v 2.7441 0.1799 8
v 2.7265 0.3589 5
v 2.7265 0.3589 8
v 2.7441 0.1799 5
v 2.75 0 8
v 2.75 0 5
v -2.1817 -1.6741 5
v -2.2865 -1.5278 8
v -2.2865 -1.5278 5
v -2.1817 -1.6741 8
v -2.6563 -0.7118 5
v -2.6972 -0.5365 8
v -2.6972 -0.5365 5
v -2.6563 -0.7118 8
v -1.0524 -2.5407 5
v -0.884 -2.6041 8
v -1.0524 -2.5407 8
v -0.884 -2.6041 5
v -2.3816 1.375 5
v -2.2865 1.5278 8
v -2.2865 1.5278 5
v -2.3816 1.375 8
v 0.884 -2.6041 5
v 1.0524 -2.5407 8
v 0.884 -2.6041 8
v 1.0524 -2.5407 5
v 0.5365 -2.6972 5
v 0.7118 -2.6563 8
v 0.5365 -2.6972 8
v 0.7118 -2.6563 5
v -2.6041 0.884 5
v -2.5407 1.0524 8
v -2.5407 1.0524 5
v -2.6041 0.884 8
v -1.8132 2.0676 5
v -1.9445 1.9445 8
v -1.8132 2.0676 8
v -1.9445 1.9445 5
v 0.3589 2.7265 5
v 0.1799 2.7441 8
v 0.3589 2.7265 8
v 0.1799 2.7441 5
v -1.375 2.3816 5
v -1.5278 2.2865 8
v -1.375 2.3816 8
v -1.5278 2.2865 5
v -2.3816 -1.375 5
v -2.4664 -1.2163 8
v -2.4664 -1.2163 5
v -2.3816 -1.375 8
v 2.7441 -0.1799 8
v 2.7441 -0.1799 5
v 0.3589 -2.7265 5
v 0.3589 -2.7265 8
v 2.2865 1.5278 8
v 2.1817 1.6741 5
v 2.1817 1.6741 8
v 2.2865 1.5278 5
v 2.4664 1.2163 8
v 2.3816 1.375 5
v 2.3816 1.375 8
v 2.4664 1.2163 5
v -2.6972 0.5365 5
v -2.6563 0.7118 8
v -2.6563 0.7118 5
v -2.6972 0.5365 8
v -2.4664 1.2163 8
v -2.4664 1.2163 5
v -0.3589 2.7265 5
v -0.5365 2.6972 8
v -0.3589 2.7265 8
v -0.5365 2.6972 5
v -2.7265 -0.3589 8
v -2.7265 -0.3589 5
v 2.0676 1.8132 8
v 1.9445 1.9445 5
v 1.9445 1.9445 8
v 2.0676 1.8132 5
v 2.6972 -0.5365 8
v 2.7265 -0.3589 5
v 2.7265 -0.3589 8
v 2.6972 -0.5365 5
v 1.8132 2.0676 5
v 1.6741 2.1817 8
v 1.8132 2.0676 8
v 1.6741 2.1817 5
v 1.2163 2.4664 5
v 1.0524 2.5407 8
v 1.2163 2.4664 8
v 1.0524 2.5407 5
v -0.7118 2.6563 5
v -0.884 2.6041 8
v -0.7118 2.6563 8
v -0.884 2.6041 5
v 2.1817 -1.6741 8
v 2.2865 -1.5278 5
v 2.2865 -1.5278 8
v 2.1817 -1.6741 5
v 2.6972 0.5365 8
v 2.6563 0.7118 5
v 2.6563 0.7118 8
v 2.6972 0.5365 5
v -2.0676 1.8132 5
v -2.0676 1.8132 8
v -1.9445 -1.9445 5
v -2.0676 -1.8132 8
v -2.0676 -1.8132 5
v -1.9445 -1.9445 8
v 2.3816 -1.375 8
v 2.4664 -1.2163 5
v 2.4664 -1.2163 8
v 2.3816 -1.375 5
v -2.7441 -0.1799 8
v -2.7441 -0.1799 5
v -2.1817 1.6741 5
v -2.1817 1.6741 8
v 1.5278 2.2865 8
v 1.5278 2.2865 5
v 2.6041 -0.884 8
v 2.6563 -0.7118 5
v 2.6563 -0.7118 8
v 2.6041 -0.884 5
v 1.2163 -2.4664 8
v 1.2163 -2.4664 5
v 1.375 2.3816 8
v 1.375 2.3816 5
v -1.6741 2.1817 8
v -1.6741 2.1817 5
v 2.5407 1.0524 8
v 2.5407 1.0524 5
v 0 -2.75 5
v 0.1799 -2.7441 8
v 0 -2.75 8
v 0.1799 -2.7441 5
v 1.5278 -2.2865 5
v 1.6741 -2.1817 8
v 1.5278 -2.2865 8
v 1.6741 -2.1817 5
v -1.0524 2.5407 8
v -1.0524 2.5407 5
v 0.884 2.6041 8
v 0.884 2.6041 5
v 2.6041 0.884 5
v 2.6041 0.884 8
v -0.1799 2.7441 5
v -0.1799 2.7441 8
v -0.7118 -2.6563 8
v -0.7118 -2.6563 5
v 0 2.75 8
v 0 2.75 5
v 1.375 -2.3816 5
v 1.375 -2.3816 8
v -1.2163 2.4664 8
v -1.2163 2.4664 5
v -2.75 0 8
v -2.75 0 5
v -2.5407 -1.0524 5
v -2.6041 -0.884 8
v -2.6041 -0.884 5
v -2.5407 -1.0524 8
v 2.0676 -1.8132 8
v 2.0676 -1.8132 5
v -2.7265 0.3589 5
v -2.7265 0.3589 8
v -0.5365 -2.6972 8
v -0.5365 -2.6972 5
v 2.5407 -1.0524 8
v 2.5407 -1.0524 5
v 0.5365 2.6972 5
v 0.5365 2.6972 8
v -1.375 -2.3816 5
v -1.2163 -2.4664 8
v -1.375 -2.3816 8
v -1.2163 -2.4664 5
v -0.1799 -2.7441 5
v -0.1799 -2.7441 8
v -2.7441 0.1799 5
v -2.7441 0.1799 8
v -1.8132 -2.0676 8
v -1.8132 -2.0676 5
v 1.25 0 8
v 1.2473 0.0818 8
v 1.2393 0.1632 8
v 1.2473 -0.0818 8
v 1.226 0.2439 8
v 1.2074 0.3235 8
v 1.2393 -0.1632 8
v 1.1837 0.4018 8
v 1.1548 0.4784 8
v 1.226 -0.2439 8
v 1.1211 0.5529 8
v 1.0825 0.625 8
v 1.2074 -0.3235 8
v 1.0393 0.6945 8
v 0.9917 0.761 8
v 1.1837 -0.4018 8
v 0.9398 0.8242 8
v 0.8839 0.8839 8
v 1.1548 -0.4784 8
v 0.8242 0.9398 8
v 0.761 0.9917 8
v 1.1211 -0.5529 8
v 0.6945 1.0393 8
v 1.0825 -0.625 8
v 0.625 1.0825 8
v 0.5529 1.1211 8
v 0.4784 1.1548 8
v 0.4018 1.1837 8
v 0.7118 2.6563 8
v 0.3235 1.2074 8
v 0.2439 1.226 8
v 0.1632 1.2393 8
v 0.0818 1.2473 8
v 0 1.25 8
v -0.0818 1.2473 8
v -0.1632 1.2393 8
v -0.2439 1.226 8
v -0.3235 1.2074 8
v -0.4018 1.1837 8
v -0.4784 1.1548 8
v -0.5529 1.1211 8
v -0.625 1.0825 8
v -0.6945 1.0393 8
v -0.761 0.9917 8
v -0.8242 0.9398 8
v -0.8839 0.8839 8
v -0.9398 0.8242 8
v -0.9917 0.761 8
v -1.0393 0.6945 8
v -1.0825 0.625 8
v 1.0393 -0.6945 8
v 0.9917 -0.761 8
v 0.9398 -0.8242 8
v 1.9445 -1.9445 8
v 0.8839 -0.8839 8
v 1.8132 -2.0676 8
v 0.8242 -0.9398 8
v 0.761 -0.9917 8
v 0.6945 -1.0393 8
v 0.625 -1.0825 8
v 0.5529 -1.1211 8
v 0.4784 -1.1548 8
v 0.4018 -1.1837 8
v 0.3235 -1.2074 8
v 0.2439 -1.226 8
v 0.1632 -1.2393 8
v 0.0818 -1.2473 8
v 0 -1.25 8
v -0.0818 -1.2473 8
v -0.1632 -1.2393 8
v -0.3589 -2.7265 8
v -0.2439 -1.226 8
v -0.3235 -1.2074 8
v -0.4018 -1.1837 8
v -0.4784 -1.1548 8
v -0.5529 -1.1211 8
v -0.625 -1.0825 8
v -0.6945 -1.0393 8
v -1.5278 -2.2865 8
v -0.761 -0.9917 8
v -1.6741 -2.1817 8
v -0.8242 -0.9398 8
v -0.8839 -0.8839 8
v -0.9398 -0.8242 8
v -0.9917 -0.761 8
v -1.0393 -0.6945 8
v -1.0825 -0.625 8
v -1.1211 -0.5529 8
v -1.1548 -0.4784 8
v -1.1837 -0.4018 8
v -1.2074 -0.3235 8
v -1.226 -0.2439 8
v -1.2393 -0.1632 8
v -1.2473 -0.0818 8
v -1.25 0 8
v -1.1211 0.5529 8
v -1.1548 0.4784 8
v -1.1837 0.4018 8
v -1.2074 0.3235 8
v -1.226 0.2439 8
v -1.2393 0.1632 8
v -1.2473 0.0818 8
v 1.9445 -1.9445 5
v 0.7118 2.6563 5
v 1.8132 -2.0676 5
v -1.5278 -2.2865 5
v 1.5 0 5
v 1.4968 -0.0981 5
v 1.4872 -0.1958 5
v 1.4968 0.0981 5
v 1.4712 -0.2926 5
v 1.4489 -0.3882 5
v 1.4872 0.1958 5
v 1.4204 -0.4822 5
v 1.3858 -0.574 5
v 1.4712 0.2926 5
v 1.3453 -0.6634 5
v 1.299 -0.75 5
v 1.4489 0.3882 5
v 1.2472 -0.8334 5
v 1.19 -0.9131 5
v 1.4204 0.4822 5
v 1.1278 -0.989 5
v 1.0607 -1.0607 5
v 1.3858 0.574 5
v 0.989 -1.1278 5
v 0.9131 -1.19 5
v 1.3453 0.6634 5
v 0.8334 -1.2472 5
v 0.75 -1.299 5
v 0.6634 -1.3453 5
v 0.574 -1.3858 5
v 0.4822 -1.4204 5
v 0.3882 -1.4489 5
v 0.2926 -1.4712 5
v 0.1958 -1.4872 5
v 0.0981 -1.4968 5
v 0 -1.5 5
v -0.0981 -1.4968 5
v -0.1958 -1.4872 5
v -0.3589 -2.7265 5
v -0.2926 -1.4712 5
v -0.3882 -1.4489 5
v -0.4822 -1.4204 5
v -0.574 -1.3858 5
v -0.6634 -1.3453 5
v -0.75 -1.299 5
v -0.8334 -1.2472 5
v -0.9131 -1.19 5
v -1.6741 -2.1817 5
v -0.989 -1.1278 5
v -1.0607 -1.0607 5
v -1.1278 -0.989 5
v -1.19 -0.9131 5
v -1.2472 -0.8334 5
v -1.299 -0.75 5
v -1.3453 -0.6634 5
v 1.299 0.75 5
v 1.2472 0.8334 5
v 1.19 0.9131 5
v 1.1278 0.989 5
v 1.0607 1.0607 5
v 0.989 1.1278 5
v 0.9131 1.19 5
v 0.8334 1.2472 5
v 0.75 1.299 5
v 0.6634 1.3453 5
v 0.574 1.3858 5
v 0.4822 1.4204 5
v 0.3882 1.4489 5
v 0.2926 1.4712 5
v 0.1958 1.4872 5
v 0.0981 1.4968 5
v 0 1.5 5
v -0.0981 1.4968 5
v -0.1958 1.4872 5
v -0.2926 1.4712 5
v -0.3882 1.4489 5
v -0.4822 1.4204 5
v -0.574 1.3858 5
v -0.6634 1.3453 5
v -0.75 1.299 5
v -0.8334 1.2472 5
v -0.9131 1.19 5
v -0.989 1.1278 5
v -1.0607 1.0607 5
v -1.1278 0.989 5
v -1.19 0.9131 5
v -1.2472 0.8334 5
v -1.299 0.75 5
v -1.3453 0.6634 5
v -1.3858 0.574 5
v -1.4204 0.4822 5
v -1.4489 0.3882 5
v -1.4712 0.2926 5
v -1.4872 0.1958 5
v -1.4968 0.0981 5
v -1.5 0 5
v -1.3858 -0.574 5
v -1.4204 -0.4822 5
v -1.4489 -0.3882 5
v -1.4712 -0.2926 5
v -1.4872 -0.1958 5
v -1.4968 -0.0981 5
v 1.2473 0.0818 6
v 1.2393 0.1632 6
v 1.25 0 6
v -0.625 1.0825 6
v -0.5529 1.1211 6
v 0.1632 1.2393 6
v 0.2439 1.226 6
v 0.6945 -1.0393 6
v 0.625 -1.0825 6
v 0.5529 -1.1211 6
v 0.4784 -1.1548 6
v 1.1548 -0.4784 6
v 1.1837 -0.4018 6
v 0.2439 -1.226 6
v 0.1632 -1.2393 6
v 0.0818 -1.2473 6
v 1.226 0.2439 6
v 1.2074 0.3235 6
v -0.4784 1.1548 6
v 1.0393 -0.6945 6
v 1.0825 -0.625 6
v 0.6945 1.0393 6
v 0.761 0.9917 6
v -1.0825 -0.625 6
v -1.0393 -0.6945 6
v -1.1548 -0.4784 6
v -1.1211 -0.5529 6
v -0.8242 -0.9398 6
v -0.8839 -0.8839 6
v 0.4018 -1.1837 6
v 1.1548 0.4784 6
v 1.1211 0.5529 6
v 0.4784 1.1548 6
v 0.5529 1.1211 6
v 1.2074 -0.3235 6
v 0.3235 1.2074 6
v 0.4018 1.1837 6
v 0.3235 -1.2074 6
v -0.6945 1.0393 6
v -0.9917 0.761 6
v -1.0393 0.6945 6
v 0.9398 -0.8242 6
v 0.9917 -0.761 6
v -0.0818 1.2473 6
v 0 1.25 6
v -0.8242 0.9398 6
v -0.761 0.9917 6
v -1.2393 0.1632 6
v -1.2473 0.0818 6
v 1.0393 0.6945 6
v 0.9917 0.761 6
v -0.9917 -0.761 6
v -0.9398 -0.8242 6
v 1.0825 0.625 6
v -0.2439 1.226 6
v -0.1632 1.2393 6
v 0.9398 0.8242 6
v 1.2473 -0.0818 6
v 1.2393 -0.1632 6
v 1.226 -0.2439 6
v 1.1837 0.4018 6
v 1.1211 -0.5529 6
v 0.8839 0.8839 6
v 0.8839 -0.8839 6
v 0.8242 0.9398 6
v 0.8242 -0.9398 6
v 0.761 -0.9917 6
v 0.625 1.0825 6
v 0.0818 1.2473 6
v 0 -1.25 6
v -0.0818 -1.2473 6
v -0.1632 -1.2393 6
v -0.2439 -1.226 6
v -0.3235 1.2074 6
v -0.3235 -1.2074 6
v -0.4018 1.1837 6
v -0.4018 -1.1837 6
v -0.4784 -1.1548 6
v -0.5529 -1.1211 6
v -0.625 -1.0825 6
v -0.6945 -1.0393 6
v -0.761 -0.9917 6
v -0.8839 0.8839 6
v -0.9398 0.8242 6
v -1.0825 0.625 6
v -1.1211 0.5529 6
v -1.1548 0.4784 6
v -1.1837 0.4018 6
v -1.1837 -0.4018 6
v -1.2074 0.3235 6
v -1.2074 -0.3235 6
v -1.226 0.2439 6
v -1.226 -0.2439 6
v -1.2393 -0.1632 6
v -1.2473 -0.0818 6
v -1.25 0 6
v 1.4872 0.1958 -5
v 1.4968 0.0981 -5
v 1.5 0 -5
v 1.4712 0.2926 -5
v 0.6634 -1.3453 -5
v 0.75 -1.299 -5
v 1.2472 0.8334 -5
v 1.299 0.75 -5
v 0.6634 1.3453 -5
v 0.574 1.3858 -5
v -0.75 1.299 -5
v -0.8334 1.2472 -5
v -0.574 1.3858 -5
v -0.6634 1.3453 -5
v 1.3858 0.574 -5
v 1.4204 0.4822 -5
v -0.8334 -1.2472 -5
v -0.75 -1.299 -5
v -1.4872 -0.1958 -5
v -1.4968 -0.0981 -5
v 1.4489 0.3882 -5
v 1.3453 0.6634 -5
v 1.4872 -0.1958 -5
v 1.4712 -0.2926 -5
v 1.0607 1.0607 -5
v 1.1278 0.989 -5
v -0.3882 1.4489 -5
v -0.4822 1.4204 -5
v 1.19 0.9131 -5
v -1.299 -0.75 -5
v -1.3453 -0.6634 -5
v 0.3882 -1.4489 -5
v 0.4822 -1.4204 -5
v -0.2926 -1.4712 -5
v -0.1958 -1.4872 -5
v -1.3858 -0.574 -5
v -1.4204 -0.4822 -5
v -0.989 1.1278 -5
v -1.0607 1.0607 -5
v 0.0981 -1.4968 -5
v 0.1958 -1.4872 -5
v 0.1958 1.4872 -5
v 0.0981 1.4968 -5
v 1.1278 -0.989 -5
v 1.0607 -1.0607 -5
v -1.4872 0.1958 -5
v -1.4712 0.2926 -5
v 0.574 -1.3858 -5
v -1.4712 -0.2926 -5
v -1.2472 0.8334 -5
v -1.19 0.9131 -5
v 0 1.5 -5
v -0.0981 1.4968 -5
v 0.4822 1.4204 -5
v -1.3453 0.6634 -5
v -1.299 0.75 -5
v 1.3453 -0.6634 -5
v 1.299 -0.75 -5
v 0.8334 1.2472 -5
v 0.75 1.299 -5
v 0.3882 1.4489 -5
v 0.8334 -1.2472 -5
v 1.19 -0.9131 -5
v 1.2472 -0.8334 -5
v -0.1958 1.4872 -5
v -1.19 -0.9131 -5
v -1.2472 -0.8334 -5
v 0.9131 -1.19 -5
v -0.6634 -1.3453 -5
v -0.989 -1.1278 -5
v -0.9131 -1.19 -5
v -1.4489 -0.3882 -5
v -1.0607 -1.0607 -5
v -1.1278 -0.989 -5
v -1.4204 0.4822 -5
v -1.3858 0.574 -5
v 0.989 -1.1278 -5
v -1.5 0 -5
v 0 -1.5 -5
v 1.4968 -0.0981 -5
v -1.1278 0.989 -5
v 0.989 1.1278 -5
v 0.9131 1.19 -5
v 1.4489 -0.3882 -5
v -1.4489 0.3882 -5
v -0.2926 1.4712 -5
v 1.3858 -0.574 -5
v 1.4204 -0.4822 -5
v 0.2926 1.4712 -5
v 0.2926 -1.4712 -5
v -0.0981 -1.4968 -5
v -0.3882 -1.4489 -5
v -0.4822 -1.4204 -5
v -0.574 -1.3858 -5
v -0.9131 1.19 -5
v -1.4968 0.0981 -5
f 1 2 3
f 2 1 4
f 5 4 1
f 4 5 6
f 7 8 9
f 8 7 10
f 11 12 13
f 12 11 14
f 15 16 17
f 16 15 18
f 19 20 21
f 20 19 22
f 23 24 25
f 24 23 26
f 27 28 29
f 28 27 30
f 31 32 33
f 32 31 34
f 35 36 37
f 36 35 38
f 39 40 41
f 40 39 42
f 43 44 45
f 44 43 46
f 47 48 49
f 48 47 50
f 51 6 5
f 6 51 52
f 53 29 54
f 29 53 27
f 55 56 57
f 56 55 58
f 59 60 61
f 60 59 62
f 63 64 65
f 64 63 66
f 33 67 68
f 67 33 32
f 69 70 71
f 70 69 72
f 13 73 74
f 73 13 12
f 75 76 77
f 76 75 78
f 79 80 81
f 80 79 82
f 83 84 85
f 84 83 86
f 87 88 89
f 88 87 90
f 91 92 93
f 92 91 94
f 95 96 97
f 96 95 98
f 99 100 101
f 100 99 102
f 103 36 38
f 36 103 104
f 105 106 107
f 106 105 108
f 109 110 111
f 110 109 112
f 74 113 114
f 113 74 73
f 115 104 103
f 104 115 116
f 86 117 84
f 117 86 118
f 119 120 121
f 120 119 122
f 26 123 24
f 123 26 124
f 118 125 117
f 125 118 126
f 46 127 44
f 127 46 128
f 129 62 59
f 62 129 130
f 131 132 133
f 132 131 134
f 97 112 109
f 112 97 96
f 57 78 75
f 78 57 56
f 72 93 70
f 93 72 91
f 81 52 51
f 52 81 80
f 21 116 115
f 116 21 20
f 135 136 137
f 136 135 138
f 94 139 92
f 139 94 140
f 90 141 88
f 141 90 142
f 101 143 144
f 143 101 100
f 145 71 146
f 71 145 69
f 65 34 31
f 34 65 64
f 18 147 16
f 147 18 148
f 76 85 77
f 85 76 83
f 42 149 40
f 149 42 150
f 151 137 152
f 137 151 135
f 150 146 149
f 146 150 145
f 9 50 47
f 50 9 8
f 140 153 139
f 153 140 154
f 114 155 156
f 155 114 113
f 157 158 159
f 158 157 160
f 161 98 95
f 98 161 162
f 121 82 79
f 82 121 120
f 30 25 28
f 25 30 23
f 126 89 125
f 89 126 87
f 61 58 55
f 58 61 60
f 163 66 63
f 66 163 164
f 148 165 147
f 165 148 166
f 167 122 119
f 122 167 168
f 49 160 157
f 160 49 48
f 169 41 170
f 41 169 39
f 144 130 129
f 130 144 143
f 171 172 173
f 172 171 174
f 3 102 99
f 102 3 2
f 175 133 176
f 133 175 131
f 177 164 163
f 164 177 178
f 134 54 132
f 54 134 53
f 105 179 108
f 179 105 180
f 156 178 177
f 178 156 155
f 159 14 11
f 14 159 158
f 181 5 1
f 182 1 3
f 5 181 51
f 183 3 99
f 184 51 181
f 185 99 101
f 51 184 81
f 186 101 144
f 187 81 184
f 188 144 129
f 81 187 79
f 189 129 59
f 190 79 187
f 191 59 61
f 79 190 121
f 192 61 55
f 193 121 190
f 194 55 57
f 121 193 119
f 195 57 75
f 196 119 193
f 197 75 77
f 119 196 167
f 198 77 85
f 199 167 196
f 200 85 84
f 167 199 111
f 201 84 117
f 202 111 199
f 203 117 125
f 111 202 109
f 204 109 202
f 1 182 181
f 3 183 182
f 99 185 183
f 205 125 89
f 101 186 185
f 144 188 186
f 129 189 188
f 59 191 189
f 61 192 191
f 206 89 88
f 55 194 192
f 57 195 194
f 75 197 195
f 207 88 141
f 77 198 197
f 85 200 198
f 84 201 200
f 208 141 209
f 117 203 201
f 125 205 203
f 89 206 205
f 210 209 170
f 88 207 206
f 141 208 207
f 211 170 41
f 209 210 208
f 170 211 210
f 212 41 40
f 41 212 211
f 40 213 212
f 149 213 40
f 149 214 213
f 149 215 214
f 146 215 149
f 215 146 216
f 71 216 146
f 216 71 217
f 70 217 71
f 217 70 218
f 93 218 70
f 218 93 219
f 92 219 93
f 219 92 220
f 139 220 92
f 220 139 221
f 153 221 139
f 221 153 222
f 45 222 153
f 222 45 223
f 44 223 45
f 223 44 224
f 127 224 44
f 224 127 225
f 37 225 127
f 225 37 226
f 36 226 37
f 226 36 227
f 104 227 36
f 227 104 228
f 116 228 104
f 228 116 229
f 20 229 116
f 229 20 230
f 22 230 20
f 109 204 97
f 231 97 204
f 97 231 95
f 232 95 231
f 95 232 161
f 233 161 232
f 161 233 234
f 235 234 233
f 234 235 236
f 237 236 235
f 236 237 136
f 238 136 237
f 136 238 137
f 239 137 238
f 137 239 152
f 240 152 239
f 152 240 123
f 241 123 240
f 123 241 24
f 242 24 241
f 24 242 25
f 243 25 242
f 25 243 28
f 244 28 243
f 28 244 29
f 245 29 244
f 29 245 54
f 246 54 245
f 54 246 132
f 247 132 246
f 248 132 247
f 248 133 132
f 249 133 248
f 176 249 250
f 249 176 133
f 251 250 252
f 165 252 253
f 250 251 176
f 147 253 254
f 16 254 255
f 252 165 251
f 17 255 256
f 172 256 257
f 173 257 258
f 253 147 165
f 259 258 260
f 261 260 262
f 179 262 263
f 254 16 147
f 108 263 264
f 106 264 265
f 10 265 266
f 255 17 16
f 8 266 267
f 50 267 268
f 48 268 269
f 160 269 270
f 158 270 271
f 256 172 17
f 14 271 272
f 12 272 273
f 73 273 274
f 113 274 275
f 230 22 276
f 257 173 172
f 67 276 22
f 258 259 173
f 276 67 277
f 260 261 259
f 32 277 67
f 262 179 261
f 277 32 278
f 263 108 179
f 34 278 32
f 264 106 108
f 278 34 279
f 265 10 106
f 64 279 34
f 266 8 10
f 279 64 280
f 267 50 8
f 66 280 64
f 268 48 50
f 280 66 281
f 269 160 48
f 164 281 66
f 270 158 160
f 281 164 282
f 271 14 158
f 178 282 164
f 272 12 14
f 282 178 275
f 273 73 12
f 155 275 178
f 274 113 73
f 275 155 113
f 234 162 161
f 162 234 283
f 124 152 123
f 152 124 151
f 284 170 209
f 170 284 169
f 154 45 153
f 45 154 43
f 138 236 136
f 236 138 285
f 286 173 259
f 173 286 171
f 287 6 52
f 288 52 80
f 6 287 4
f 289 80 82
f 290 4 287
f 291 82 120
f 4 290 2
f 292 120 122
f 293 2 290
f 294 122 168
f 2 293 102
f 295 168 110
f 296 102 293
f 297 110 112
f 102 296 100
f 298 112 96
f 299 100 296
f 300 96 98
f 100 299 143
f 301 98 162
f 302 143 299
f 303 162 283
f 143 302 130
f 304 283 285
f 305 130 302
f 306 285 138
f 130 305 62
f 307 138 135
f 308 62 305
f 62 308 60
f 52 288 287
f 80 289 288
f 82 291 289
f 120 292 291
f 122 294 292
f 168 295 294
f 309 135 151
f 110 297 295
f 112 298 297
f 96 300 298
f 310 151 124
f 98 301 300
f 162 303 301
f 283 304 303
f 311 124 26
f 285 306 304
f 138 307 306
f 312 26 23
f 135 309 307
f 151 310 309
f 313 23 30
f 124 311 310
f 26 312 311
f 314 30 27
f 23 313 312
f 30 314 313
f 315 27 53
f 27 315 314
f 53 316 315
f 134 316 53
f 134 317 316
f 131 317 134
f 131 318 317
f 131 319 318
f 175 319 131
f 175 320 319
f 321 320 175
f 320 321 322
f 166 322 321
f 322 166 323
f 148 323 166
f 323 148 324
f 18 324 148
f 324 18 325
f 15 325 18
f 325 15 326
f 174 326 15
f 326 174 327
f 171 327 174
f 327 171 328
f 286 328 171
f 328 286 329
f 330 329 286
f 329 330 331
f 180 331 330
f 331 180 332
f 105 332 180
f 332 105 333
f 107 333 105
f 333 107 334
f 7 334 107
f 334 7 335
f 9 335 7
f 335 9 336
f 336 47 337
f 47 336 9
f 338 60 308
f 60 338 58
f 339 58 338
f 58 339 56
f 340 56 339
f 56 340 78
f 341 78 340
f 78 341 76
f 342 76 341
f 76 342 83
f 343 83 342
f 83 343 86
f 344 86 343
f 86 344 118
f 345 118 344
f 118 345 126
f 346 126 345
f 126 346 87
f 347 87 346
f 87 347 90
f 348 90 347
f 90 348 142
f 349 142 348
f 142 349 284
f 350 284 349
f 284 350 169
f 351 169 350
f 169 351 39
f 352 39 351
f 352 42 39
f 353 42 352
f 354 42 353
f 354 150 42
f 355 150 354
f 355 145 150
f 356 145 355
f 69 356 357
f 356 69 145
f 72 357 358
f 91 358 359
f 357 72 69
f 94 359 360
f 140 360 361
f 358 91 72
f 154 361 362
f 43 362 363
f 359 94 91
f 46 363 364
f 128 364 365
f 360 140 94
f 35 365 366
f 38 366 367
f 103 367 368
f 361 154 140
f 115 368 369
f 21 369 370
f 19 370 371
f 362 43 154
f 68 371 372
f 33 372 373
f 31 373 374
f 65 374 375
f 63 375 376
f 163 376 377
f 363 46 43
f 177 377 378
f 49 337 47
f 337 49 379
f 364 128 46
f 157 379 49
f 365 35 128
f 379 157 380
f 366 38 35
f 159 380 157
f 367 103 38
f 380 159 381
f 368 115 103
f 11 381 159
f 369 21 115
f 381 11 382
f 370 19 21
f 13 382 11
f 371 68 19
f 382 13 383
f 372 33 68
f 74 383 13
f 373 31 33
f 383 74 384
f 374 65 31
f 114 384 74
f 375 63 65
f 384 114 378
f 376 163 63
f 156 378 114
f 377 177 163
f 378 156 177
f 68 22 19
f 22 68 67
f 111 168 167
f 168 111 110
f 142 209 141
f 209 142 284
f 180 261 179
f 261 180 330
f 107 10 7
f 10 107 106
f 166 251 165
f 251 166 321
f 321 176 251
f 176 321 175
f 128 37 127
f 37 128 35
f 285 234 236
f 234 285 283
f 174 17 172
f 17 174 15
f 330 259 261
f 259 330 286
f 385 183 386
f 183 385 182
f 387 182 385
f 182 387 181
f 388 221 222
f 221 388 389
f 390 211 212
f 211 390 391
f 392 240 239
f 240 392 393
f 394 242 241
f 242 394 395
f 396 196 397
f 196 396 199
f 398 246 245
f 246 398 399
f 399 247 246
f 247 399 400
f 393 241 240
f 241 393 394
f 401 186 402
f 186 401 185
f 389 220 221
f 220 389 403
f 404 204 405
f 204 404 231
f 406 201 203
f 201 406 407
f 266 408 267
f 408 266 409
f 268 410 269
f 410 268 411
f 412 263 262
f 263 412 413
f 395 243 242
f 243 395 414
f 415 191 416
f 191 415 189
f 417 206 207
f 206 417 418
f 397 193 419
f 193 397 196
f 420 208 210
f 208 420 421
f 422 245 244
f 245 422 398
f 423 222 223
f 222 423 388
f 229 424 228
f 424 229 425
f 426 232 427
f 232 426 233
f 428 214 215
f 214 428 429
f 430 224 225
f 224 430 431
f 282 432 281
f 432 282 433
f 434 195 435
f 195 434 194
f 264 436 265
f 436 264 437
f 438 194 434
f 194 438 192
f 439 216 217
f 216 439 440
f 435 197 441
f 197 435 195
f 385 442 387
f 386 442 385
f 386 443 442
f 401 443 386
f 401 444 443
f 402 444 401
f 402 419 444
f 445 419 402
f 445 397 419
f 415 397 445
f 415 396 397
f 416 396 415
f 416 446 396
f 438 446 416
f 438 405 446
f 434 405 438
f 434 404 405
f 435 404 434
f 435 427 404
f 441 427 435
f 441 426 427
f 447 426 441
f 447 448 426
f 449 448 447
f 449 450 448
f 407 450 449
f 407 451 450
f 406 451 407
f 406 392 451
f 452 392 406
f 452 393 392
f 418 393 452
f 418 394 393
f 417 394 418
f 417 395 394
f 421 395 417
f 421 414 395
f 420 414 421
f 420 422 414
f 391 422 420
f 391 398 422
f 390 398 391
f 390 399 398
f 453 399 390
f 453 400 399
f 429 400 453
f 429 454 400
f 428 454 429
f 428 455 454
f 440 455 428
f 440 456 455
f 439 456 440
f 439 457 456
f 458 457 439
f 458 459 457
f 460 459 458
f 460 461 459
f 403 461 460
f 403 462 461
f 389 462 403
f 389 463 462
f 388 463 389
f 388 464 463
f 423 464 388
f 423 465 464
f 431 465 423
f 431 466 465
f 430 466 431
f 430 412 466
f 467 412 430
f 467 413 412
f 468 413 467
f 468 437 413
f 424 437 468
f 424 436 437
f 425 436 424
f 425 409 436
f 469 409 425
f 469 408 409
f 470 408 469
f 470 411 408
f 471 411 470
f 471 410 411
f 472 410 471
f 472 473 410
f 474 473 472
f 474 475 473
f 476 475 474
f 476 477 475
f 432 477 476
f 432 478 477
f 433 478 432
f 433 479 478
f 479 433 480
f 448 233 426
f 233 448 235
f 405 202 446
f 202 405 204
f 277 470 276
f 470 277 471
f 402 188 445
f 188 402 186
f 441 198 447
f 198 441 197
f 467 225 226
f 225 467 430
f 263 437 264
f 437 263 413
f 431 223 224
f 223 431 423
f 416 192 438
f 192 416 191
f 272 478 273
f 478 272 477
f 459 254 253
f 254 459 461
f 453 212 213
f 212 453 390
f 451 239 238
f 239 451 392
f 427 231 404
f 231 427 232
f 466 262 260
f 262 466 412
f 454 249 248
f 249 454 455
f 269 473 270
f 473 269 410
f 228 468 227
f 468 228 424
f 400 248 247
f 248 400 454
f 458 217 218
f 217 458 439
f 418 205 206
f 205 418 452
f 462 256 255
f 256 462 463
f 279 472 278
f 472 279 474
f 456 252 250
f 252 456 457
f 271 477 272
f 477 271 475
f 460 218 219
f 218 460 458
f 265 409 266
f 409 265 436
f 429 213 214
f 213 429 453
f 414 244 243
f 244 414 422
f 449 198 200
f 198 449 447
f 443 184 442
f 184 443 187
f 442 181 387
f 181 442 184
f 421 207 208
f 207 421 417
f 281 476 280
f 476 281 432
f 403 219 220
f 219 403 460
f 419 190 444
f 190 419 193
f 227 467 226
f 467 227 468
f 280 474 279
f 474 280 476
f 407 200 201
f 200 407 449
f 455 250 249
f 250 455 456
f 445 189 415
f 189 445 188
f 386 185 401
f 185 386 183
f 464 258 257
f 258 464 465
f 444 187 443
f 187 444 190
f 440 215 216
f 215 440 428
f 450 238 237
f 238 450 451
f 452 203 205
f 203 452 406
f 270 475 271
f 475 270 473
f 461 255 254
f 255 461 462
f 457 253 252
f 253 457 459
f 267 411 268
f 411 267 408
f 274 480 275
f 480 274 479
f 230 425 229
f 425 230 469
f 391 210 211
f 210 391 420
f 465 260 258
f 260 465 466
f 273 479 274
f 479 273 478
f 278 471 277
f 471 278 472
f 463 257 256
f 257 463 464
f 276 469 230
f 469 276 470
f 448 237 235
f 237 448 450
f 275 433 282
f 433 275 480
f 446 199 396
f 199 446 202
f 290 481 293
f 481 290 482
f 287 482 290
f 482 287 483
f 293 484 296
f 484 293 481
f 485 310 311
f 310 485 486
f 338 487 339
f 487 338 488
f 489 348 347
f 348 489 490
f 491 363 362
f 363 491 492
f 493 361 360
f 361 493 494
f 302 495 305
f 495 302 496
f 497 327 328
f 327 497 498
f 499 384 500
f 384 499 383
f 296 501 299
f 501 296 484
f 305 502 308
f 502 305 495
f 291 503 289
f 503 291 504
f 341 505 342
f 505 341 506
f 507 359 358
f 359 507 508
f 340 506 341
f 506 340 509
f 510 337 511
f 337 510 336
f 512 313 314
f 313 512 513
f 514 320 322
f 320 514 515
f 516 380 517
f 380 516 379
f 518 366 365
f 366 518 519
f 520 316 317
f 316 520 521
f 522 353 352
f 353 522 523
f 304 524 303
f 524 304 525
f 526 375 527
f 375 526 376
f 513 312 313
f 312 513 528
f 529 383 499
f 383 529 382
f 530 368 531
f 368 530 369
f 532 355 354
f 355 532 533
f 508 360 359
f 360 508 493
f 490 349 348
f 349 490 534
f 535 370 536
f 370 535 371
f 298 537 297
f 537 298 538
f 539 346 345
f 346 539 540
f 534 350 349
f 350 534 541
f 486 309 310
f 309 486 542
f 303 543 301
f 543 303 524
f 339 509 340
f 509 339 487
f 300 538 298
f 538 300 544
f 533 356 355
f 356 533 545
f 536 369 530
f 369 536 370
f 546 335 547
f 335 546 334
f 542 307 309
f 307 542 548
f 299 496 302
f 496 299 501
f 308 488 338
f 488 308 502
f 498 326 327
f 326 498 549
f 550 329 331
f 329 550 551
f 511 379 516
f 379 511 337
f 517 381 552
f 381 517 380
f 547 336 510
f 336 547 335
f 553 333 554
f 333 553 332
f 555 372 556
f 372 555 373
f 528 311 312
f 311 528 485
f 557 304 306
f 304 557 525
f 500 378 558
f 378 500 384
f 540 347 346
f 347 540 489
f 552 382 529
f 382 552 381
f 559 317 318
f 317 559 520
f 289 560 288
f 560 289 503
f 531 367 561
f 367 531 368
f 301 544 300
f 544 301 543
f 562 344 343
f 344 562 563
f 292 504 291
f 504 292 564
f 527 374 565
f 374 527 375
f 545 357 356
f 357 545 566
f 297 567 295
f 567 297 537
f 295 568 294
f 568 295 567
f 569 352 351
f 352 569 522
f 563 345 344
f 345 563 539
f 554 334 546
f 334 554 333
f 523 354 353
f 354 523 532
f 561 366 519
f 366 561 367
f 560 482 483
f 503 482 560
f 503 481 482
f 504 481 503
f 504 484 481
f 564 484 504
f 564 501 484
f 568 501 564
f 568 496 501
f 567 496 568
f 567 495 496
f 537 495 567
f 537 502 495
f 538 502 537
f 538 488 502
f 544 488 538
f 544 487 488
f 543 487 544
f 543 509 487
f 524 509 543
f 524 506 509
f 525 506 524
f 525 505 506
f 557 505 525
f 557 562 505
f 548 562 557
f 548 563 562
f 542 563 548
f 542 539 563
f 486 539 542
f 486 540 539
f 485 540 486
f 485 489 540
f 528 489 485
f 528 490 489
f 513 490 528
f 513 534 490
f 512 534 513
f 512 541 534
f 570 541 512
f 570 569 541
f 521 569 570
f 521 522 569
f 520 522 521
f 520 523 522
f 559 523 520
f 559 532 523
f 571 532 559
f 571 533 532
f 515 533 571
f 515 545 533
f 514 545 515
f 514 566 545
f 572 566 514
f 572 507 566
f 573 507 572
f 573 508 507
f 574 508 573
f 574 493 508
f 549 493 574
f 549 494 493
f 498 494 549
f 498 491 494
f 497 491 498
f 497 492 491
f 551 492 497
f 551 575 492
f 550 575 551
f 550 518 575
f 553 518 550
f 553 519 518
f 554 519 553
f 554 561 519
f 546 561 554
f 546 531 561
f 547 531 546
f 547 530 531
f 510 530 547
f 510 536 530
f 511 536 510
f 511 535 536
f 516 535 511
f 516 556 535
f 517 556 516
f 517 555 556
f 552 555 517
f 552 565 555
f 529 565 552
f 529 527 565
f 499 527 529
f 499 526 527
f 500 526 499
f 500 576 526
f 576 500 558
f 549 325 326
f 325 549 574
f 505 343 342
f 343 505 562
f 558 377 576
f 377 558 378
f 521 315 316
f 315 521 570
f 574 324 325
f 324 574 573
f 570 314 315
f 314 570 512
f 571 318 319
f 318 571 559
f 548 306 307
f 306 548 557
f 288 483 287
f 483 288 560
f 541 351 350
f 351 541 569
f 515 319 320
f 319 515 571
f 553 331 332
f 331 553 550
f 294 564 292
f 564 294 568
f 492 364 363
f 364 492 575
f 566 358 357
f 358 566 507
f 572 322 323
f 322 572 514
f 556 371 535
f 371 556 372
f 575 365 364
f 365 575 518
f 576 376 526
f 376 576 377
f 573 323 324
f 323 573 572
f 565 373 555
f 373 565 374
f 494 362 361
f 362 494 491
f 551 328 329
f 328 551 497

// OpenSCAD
$fn=96;

module socket_head_cap_screw(d=3.0, L=10.0, head_d=5.5, head_h=3.0, socket_d=2.5, socket_depth=2.0) {
    union() {
        translate([0,0,-L/2])
            cylinder(d=d, h=L, $fn=96);

        translate([0,0,L/2])
            difference() {
                cylinder(d=head_d, h=head_h, $fn=96);
                translate([0,0,head_h - socket_depth])
                    cylinder(d=socket_d, h=socket_depth + 0.2, $fn=96);
            }
    }
}

socket_head_cap_screw(d=3.0, L=10.0, head_d=5.5, head_h=3.0, socket_d=2.5, socket_depth=2.0);
